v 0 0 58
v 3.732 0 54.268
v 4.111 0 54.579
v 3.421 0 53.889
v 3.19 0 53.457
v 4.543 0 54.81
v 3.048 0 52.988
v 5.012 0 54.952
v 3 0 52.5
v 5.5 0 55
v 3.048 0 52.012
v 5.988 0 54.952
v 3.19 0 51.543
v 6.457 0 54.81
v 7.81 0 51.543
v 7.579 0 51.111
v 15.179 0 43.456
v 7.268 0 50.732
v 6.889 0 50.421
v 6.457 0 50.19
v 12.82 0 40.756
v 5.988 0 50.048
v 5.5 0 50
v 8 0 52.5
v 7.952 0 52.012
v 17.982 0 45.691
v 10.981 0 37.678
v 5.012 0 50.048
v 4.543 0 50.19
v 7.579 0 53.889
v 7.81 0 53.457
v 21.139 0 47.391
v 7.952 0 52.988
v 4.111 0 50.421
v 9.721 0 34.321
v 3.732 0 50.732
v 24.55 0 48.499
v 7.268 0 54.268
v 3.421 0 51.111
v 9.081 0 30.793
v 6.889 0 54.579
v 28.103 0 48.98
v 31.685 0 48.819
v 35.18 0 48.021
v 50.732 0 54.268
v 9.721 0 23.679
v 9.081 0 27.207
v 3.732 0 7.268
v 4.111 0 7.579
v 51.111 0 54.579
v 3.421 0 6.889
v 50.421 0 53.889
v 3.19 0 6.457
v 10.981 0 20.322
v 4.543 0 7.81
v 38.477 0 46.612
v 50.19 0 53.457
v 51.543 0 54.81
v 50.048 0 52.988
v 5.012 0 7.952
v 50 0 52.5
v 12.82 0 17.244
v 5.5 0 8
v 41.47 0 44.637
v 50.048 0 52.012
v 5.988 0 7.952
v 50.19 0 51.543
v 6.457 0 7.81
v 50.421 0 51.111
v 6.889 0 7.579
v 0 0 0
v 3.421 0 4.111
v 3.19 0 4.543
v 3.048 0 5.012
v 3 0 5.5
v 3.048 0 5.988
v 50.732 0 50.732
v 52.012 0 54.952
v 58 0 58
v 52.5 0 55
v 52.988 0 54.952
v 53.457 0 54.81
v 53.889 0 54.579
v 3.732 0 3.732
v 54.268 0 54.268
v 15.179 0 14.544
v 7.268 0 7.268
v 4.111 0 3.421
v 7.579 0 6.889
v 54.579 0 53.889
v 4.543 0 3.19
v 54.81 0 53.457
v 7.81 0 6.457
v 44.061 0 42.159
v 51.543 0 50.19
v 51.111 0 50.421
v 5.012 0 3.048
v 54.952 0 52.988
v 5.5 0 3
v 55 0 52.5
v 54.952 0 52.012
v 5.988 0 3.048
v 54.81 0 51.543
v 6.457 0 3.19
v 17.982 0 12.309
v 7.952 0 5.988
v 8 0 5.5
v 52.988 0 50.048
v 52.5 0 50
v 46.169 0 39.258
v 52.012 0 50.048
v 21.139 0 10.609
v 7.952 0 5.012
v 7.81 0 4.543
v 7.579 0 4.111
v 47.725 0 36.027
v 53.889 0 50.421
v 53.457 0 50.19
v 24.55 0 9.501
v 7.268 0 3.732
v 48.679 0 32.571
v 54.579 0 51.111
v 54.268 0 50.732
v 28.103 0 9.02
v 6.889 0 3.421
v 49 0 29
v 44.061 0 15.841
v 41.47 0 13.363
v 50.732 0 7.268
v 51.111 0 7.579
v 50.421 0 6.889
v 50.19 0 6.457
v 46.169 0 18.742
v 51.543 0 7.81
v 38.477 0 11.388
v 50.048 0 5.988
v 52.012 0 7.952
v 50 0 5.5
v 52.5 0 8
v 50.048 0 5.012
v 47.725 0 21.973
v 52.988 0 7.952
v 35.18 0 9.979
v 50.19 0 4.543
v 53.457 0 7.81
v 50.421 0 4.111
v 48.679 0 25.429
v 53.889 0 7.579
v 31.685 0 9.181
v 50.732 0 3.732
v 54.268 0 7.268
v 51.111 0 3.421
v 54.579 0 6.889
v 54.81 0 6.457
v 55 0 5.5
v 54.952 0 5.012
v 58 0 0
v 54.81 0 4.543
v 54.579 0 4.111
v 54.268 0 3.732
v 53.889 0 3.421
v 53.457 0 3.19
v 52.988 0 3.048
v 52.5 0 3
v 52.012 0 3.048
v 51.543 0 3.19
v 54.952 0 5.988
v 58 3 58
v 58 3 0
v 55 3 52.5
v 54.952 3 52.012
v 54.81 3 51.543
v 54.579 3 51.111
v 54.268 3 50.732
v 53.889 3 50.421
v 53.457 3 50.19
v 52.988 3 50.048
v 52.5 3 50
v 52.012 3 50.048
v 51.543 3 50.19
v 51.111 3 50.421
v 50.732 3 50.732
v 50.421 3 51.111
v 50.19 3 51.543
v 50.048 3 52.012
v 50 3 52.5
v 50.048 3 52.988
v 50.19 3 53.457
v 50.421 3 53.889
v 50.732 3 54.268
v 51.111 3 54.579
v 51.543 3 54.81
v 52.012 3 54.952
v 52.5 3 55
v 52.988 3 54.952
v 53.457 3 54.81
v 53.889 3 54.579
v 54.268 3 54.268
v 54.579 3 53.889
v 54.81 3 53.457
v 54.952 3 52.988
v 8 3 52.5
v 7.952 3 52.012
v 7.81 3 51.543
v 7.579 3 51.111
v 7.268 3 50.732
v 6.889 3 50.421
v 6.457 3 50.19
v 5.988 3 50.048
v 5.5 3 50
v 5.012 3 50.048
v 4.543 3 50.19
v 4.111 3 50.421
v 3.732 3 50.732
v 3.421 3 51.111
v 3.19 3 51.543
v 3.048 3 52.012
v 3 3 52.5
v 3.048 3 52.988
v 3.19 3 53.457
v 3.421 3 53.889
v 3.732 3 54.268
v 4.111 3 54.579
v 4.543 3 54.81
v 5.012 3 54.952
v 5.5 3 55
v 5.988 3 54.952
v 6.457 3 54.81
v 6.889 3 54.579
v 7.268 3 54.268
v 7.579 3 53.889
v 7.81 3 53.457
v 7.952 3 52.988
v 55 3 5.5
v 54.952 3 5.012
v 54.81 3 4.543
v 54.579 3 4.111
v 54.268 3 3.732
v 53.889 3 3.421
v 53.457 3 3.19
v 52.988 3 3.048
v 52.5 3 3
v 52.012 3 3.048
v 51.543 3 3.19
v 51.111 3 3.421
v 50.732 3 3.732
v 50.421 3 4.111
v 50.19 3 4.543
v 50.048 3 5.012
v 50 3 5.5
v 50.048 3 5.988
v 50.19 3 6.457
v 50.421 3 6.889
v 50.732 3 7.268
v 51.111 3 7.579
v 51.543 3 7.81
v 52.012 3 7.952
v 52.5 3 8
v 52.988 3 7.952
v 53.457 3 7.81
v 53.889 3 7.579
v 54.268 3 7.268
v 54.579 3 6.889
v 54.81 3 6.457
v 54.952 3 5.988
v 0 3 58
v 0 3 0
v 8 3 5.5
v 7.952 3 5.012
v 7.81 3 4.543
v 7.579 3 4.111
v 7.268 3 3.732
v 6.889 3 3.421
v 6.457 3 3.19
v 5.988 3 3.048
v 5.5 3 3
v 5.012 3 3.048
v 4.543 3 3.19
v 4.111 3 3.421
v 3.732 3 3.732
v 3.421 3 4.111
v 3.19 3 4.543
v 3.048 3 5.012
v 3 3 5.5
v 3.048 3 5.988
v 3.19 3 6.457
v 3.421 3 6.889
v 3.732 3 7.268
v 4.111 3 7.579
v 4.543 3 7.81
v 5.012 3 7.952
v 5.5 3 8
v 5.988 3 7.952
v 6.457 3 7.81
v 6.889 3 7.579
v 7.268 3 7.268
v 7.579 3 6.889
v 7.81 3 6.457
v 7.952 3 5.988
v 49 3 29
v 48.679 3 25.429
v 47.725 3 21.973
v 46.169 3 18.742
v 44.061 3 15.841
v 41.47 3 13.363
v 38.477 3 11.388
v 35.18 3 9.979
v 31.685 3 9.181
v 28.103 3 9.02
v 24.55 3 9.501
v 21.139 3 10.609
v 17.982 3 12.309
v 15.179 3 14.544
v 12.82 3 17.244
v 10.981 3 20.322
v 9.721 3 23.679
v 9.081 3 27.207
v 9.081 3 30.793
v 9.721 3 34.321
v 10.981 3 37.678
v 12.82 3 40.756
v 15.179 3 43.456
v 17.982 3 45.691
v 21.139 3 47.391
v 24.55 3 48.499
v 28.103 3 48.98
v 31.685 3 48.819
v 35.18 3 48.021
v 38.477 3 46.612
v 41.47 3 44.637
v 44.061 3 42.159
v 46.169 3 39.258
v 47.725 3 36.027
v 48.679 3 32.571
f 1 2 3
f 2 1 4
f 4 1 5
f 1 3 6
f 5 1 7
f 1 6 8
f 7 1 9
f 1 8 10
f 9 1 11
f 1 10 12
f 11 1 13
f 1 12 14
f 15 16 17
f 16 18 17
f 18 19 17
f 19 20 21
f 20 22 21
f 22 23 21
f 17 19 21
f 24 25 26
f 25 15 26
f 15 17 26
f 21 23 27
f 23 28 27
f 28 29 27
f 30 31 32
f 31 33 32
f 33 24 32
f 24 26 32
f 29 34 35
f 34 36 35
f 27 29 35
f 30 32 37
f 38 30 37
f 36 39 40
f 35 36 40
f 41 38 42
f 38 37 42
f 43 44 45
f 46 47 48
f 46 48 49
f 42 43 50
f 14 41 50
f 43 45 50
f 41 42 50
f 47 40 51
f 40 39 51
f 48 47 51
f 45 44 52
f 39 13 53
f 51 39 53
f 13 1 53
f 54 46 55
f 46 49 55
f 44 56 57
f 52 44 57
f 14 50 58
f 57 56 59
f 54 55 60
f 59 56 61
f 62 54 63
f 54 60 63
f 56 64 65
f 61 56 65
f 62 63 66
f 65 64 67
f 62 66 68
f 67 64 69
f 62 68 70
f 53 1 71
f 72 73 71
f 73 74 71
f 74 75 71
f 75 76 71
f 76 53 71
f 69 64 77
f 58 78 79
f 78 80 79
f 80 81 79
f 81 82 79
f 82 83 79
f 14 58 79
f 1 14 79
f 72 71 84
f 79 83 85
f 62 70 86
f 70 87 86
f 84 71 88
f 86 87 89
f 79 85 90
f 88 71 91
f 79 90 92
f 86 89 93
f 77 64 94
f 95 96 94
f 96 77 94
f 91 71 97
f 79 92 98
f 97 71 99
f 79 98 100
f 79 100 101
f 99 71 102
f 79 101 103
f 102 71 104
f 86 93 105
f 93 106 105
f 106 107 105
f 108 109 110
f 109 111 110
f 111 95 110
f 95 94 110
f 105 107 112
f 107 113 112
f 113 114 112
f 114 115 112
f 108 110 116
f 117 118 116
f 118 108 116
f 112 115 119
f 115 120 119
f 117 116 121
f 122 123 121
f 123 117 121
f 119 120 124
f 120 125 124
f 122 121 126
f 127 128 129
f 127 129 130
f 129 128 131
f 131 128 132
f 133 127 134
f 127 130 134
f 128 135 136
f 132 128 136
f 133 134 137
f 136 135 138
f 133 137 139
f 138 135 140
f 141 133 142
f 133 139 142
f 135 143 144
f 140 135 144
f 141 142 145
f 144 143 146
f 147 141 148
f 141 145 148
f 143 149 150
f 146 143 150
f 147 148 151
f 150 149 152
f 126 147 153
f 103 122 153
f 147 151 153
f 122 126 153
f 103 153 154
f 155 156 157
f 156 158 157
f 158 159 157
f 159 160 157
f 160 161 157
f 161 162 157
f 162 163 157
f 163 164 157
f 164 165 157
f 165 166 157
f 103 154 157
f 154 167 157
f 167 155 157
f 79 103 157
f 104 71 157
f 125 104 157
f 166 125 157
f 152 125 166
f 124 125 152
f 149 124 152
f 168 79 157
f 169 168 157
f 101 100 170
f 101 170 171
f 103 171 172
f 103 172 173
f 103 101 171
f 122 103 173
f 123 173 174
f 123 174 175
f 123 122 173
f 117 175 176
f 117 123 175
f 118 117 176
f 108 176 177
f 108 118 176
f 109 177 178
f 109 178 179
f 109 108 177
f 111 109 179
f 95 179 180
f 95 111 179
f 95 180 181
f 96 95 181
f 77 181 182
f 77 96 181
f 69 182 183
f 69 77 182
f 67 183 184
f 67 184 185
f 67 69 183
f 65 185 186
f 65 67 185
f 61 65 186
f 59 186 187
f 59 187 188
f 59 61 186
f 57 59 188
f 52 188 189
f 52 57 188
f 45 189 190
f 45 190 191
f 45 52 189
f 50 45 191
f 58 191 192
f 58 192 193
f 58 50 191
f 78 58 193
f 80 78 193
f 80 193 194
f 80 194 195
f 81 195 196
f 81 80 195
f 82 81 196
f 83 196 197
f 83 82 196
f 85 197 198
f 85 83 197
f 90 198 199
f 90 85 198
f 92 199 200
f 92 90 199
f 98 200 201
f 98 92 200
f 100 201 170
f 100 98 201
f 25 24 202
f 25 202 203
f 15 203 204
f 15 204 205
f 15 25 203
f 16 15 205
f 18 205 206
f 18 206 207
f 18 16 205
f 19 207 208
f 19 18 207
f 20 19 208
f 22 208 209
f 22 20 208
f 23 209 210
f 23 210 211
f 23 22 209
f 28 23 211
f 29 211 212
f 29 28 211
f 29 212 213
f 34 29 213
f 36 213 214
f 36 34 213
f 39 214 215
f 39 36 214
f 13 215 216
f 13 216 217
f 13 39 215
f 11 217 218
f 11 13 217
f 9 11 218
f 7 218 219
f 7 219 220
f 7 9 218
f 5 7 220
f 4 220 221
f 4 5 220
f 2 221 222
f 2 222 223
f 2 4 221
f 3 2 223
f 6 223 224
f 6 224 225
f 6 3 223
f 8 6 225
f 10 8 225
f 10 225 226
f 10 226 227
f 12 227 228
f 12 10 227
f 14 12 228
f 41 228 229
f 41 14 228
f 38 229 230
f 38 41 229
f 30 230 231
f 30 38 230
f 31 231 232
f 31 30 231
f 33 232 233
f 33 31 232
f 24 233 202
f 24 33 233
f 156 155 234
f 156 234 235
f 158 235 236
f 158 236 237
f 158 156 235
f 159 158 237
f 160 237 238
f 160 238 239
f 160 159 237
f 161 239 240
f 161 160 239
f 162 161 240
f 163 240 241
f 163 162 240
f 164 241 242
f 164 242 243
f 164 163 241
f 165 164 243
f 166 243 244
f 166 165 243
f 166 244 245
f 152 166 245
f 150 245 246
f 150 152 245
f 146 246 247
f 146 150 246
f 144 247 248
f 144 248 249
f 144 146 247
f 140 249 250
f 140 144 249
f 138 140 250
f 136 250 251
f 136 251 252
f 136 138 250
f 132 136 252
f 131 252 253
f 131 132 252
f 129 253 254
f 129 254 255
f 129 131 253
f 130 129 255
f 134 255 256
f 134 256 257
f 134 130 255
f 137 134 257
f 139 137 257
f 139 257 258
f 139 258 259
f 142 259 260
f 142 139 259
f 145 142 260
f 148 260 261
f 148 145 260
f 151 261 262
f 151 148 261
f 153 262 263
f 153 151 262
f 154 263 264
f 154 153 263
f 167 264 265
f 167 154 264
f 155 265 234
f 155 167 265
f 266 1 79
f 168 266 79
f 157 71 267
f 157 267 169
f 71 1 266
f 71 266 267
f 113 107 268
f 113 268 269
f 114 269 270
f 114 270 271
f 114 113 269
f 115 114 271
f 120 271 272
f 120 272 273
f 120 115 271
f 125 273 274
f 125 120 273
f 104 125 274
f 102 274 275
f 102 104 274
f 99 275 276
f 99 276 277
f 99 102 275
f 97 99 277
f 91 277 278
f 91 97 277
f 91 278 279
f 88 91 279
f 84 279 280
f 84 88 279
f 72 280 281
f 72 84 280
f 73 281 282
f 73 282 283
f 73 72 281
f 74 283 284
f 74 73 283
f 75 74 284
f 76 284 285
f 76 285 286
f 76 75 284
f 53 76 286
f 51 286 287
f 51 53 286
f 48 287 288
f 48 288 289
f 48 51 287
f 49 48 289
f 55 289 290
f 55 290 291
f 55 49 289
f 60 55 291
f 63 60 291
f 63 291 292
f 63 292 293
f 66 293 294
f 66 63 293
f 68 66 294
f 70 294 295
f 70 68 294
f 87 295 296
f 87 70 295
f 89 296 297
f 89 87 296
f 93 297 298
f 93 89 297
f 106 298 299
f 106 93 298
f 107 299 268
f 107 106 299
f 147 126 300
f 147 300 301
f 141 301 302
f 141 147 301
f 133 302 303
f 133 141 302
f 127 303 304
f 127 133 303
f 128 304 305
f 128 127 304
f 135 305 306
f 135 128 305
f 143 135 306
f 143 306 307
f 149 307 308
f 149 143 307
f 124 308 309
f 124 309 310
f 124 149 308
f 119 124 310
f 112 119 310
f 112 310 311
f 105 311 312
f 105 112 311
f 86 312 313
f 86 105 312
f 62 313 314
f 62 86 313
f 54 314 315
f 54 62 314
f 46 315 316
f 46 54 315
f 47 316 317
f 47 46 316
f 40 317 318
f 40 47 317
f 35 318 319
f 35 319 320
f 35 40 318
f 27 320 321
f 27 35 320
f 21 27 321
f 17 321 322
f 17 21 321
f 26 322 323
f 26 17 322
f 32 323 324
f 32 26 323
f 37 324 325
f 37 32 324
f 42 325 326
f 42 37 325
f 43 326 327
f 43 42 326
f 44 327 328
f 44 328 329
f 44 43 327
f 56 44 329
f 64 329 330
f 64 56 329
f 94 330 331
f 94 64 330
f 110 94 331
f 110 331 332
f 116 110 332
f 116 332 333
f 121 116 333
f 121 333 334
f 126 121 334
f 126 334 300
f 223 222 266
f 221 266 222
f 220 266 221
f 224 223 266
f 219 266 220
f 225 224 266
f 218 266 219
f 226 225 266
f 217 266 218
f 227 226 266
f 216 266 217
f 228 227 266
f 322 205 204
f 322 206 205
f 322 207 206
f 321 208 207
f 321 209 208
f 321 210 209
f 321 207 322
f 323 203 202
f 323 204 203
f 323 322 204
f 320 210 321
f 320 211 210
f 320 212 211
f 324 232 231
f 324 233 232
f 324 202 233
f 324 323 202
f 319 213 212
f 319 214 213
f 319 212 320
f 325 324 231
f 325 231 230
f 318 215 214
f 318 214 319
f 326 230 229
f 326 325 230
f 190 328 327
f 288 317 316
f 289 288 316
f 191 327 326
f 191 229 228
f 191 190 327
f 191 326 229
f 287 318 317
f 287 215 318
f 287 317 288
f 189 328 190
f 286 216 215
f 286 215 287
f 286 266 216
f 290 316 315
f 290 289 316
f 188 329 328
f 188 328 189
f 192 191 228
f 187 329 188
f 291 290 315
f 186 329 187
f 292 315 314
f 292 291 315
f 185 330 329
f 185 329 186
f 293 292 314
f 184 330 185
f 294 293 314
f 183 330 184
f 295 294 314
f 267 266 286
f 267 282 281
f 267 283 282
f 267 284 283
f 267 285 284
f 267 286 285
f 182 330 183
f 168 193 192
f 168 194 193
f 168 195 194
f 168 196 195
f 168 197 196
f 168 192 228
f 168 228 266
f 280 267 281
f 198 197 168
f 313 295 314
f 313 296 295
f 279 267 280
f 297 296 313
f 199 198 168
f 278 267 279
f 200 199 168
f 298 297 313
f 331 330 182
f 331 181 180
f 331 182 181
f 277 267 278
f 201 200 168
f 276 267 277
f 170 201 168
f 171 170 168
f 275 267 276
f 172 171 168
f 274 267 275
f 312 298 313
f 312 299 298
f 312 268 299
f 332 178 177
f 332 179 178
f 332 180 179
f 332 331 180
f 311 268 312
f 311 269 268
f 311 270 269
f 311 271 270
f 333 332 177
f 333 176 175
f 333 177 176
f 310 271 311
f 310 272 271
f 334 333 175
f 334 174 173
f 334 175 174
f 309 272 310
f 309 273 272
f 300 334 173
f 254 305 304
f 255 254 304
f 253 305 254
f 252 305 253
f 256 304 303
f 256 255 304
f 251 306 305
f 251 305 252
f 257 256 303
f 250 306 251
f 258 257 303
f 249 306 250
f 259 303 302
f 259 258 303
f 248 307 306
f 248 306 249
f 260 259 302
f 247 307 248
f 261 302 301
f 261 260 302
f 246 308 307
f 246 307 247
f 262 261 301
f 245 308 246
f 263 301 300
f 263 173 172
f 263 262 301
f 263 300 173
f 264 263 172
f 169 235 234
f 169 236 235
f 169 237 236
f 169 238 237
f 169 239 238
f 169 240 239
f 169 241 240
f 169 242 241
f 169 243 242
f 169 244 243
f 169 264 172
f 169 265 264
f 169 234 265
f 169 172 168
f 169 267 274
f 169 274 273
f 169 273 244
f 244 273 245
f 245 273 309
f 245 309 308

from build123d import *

# Parameters (mm, degrees)
SKETCH1_W           = 58
SKETCH1_H           = 58
SKETCH1_R           = 20
SKETCH1_R_2         = 2.5
BOSS_EXTRUDE1_DEPTH = 3


with BuildPart() as part:
    # Sketch1 → Boss-Extrude1 (new body)
    with BuildSketch(Plane(origin=(0, 0, 0), x_dir=(1, 0, 0), z_dir=(0, 1, 0))):
        with Locations((29, -29)):
            Rectangle(SKETCH1_W, SKETCH1_H)
        with Locations((29, -29)):
            Circle(SKETCH1_R, mode=Mode.SUBTRACT)
        with Locations((5.5, -5.5)):
            Circle(SKETCH1_R_2, mode=Mode.SUBTRACT)
        with Locations((52.5, -5.5)):
            Circle(SKETCH1_R_2, mode=Mode.SUBTRACT)
        with Locations((52.5, -52.5)):
            Circle(SKETCH1_R_2, mode=Mode.SUBTRACT)
        with Locations((5.5, -52.5)):
            Circle(SKETCH1_R_2, mode=Mode.SUBTRACT)
    extrude(amount=BOSS_EXTRUDE1_DEPTH)


solid = part.part
